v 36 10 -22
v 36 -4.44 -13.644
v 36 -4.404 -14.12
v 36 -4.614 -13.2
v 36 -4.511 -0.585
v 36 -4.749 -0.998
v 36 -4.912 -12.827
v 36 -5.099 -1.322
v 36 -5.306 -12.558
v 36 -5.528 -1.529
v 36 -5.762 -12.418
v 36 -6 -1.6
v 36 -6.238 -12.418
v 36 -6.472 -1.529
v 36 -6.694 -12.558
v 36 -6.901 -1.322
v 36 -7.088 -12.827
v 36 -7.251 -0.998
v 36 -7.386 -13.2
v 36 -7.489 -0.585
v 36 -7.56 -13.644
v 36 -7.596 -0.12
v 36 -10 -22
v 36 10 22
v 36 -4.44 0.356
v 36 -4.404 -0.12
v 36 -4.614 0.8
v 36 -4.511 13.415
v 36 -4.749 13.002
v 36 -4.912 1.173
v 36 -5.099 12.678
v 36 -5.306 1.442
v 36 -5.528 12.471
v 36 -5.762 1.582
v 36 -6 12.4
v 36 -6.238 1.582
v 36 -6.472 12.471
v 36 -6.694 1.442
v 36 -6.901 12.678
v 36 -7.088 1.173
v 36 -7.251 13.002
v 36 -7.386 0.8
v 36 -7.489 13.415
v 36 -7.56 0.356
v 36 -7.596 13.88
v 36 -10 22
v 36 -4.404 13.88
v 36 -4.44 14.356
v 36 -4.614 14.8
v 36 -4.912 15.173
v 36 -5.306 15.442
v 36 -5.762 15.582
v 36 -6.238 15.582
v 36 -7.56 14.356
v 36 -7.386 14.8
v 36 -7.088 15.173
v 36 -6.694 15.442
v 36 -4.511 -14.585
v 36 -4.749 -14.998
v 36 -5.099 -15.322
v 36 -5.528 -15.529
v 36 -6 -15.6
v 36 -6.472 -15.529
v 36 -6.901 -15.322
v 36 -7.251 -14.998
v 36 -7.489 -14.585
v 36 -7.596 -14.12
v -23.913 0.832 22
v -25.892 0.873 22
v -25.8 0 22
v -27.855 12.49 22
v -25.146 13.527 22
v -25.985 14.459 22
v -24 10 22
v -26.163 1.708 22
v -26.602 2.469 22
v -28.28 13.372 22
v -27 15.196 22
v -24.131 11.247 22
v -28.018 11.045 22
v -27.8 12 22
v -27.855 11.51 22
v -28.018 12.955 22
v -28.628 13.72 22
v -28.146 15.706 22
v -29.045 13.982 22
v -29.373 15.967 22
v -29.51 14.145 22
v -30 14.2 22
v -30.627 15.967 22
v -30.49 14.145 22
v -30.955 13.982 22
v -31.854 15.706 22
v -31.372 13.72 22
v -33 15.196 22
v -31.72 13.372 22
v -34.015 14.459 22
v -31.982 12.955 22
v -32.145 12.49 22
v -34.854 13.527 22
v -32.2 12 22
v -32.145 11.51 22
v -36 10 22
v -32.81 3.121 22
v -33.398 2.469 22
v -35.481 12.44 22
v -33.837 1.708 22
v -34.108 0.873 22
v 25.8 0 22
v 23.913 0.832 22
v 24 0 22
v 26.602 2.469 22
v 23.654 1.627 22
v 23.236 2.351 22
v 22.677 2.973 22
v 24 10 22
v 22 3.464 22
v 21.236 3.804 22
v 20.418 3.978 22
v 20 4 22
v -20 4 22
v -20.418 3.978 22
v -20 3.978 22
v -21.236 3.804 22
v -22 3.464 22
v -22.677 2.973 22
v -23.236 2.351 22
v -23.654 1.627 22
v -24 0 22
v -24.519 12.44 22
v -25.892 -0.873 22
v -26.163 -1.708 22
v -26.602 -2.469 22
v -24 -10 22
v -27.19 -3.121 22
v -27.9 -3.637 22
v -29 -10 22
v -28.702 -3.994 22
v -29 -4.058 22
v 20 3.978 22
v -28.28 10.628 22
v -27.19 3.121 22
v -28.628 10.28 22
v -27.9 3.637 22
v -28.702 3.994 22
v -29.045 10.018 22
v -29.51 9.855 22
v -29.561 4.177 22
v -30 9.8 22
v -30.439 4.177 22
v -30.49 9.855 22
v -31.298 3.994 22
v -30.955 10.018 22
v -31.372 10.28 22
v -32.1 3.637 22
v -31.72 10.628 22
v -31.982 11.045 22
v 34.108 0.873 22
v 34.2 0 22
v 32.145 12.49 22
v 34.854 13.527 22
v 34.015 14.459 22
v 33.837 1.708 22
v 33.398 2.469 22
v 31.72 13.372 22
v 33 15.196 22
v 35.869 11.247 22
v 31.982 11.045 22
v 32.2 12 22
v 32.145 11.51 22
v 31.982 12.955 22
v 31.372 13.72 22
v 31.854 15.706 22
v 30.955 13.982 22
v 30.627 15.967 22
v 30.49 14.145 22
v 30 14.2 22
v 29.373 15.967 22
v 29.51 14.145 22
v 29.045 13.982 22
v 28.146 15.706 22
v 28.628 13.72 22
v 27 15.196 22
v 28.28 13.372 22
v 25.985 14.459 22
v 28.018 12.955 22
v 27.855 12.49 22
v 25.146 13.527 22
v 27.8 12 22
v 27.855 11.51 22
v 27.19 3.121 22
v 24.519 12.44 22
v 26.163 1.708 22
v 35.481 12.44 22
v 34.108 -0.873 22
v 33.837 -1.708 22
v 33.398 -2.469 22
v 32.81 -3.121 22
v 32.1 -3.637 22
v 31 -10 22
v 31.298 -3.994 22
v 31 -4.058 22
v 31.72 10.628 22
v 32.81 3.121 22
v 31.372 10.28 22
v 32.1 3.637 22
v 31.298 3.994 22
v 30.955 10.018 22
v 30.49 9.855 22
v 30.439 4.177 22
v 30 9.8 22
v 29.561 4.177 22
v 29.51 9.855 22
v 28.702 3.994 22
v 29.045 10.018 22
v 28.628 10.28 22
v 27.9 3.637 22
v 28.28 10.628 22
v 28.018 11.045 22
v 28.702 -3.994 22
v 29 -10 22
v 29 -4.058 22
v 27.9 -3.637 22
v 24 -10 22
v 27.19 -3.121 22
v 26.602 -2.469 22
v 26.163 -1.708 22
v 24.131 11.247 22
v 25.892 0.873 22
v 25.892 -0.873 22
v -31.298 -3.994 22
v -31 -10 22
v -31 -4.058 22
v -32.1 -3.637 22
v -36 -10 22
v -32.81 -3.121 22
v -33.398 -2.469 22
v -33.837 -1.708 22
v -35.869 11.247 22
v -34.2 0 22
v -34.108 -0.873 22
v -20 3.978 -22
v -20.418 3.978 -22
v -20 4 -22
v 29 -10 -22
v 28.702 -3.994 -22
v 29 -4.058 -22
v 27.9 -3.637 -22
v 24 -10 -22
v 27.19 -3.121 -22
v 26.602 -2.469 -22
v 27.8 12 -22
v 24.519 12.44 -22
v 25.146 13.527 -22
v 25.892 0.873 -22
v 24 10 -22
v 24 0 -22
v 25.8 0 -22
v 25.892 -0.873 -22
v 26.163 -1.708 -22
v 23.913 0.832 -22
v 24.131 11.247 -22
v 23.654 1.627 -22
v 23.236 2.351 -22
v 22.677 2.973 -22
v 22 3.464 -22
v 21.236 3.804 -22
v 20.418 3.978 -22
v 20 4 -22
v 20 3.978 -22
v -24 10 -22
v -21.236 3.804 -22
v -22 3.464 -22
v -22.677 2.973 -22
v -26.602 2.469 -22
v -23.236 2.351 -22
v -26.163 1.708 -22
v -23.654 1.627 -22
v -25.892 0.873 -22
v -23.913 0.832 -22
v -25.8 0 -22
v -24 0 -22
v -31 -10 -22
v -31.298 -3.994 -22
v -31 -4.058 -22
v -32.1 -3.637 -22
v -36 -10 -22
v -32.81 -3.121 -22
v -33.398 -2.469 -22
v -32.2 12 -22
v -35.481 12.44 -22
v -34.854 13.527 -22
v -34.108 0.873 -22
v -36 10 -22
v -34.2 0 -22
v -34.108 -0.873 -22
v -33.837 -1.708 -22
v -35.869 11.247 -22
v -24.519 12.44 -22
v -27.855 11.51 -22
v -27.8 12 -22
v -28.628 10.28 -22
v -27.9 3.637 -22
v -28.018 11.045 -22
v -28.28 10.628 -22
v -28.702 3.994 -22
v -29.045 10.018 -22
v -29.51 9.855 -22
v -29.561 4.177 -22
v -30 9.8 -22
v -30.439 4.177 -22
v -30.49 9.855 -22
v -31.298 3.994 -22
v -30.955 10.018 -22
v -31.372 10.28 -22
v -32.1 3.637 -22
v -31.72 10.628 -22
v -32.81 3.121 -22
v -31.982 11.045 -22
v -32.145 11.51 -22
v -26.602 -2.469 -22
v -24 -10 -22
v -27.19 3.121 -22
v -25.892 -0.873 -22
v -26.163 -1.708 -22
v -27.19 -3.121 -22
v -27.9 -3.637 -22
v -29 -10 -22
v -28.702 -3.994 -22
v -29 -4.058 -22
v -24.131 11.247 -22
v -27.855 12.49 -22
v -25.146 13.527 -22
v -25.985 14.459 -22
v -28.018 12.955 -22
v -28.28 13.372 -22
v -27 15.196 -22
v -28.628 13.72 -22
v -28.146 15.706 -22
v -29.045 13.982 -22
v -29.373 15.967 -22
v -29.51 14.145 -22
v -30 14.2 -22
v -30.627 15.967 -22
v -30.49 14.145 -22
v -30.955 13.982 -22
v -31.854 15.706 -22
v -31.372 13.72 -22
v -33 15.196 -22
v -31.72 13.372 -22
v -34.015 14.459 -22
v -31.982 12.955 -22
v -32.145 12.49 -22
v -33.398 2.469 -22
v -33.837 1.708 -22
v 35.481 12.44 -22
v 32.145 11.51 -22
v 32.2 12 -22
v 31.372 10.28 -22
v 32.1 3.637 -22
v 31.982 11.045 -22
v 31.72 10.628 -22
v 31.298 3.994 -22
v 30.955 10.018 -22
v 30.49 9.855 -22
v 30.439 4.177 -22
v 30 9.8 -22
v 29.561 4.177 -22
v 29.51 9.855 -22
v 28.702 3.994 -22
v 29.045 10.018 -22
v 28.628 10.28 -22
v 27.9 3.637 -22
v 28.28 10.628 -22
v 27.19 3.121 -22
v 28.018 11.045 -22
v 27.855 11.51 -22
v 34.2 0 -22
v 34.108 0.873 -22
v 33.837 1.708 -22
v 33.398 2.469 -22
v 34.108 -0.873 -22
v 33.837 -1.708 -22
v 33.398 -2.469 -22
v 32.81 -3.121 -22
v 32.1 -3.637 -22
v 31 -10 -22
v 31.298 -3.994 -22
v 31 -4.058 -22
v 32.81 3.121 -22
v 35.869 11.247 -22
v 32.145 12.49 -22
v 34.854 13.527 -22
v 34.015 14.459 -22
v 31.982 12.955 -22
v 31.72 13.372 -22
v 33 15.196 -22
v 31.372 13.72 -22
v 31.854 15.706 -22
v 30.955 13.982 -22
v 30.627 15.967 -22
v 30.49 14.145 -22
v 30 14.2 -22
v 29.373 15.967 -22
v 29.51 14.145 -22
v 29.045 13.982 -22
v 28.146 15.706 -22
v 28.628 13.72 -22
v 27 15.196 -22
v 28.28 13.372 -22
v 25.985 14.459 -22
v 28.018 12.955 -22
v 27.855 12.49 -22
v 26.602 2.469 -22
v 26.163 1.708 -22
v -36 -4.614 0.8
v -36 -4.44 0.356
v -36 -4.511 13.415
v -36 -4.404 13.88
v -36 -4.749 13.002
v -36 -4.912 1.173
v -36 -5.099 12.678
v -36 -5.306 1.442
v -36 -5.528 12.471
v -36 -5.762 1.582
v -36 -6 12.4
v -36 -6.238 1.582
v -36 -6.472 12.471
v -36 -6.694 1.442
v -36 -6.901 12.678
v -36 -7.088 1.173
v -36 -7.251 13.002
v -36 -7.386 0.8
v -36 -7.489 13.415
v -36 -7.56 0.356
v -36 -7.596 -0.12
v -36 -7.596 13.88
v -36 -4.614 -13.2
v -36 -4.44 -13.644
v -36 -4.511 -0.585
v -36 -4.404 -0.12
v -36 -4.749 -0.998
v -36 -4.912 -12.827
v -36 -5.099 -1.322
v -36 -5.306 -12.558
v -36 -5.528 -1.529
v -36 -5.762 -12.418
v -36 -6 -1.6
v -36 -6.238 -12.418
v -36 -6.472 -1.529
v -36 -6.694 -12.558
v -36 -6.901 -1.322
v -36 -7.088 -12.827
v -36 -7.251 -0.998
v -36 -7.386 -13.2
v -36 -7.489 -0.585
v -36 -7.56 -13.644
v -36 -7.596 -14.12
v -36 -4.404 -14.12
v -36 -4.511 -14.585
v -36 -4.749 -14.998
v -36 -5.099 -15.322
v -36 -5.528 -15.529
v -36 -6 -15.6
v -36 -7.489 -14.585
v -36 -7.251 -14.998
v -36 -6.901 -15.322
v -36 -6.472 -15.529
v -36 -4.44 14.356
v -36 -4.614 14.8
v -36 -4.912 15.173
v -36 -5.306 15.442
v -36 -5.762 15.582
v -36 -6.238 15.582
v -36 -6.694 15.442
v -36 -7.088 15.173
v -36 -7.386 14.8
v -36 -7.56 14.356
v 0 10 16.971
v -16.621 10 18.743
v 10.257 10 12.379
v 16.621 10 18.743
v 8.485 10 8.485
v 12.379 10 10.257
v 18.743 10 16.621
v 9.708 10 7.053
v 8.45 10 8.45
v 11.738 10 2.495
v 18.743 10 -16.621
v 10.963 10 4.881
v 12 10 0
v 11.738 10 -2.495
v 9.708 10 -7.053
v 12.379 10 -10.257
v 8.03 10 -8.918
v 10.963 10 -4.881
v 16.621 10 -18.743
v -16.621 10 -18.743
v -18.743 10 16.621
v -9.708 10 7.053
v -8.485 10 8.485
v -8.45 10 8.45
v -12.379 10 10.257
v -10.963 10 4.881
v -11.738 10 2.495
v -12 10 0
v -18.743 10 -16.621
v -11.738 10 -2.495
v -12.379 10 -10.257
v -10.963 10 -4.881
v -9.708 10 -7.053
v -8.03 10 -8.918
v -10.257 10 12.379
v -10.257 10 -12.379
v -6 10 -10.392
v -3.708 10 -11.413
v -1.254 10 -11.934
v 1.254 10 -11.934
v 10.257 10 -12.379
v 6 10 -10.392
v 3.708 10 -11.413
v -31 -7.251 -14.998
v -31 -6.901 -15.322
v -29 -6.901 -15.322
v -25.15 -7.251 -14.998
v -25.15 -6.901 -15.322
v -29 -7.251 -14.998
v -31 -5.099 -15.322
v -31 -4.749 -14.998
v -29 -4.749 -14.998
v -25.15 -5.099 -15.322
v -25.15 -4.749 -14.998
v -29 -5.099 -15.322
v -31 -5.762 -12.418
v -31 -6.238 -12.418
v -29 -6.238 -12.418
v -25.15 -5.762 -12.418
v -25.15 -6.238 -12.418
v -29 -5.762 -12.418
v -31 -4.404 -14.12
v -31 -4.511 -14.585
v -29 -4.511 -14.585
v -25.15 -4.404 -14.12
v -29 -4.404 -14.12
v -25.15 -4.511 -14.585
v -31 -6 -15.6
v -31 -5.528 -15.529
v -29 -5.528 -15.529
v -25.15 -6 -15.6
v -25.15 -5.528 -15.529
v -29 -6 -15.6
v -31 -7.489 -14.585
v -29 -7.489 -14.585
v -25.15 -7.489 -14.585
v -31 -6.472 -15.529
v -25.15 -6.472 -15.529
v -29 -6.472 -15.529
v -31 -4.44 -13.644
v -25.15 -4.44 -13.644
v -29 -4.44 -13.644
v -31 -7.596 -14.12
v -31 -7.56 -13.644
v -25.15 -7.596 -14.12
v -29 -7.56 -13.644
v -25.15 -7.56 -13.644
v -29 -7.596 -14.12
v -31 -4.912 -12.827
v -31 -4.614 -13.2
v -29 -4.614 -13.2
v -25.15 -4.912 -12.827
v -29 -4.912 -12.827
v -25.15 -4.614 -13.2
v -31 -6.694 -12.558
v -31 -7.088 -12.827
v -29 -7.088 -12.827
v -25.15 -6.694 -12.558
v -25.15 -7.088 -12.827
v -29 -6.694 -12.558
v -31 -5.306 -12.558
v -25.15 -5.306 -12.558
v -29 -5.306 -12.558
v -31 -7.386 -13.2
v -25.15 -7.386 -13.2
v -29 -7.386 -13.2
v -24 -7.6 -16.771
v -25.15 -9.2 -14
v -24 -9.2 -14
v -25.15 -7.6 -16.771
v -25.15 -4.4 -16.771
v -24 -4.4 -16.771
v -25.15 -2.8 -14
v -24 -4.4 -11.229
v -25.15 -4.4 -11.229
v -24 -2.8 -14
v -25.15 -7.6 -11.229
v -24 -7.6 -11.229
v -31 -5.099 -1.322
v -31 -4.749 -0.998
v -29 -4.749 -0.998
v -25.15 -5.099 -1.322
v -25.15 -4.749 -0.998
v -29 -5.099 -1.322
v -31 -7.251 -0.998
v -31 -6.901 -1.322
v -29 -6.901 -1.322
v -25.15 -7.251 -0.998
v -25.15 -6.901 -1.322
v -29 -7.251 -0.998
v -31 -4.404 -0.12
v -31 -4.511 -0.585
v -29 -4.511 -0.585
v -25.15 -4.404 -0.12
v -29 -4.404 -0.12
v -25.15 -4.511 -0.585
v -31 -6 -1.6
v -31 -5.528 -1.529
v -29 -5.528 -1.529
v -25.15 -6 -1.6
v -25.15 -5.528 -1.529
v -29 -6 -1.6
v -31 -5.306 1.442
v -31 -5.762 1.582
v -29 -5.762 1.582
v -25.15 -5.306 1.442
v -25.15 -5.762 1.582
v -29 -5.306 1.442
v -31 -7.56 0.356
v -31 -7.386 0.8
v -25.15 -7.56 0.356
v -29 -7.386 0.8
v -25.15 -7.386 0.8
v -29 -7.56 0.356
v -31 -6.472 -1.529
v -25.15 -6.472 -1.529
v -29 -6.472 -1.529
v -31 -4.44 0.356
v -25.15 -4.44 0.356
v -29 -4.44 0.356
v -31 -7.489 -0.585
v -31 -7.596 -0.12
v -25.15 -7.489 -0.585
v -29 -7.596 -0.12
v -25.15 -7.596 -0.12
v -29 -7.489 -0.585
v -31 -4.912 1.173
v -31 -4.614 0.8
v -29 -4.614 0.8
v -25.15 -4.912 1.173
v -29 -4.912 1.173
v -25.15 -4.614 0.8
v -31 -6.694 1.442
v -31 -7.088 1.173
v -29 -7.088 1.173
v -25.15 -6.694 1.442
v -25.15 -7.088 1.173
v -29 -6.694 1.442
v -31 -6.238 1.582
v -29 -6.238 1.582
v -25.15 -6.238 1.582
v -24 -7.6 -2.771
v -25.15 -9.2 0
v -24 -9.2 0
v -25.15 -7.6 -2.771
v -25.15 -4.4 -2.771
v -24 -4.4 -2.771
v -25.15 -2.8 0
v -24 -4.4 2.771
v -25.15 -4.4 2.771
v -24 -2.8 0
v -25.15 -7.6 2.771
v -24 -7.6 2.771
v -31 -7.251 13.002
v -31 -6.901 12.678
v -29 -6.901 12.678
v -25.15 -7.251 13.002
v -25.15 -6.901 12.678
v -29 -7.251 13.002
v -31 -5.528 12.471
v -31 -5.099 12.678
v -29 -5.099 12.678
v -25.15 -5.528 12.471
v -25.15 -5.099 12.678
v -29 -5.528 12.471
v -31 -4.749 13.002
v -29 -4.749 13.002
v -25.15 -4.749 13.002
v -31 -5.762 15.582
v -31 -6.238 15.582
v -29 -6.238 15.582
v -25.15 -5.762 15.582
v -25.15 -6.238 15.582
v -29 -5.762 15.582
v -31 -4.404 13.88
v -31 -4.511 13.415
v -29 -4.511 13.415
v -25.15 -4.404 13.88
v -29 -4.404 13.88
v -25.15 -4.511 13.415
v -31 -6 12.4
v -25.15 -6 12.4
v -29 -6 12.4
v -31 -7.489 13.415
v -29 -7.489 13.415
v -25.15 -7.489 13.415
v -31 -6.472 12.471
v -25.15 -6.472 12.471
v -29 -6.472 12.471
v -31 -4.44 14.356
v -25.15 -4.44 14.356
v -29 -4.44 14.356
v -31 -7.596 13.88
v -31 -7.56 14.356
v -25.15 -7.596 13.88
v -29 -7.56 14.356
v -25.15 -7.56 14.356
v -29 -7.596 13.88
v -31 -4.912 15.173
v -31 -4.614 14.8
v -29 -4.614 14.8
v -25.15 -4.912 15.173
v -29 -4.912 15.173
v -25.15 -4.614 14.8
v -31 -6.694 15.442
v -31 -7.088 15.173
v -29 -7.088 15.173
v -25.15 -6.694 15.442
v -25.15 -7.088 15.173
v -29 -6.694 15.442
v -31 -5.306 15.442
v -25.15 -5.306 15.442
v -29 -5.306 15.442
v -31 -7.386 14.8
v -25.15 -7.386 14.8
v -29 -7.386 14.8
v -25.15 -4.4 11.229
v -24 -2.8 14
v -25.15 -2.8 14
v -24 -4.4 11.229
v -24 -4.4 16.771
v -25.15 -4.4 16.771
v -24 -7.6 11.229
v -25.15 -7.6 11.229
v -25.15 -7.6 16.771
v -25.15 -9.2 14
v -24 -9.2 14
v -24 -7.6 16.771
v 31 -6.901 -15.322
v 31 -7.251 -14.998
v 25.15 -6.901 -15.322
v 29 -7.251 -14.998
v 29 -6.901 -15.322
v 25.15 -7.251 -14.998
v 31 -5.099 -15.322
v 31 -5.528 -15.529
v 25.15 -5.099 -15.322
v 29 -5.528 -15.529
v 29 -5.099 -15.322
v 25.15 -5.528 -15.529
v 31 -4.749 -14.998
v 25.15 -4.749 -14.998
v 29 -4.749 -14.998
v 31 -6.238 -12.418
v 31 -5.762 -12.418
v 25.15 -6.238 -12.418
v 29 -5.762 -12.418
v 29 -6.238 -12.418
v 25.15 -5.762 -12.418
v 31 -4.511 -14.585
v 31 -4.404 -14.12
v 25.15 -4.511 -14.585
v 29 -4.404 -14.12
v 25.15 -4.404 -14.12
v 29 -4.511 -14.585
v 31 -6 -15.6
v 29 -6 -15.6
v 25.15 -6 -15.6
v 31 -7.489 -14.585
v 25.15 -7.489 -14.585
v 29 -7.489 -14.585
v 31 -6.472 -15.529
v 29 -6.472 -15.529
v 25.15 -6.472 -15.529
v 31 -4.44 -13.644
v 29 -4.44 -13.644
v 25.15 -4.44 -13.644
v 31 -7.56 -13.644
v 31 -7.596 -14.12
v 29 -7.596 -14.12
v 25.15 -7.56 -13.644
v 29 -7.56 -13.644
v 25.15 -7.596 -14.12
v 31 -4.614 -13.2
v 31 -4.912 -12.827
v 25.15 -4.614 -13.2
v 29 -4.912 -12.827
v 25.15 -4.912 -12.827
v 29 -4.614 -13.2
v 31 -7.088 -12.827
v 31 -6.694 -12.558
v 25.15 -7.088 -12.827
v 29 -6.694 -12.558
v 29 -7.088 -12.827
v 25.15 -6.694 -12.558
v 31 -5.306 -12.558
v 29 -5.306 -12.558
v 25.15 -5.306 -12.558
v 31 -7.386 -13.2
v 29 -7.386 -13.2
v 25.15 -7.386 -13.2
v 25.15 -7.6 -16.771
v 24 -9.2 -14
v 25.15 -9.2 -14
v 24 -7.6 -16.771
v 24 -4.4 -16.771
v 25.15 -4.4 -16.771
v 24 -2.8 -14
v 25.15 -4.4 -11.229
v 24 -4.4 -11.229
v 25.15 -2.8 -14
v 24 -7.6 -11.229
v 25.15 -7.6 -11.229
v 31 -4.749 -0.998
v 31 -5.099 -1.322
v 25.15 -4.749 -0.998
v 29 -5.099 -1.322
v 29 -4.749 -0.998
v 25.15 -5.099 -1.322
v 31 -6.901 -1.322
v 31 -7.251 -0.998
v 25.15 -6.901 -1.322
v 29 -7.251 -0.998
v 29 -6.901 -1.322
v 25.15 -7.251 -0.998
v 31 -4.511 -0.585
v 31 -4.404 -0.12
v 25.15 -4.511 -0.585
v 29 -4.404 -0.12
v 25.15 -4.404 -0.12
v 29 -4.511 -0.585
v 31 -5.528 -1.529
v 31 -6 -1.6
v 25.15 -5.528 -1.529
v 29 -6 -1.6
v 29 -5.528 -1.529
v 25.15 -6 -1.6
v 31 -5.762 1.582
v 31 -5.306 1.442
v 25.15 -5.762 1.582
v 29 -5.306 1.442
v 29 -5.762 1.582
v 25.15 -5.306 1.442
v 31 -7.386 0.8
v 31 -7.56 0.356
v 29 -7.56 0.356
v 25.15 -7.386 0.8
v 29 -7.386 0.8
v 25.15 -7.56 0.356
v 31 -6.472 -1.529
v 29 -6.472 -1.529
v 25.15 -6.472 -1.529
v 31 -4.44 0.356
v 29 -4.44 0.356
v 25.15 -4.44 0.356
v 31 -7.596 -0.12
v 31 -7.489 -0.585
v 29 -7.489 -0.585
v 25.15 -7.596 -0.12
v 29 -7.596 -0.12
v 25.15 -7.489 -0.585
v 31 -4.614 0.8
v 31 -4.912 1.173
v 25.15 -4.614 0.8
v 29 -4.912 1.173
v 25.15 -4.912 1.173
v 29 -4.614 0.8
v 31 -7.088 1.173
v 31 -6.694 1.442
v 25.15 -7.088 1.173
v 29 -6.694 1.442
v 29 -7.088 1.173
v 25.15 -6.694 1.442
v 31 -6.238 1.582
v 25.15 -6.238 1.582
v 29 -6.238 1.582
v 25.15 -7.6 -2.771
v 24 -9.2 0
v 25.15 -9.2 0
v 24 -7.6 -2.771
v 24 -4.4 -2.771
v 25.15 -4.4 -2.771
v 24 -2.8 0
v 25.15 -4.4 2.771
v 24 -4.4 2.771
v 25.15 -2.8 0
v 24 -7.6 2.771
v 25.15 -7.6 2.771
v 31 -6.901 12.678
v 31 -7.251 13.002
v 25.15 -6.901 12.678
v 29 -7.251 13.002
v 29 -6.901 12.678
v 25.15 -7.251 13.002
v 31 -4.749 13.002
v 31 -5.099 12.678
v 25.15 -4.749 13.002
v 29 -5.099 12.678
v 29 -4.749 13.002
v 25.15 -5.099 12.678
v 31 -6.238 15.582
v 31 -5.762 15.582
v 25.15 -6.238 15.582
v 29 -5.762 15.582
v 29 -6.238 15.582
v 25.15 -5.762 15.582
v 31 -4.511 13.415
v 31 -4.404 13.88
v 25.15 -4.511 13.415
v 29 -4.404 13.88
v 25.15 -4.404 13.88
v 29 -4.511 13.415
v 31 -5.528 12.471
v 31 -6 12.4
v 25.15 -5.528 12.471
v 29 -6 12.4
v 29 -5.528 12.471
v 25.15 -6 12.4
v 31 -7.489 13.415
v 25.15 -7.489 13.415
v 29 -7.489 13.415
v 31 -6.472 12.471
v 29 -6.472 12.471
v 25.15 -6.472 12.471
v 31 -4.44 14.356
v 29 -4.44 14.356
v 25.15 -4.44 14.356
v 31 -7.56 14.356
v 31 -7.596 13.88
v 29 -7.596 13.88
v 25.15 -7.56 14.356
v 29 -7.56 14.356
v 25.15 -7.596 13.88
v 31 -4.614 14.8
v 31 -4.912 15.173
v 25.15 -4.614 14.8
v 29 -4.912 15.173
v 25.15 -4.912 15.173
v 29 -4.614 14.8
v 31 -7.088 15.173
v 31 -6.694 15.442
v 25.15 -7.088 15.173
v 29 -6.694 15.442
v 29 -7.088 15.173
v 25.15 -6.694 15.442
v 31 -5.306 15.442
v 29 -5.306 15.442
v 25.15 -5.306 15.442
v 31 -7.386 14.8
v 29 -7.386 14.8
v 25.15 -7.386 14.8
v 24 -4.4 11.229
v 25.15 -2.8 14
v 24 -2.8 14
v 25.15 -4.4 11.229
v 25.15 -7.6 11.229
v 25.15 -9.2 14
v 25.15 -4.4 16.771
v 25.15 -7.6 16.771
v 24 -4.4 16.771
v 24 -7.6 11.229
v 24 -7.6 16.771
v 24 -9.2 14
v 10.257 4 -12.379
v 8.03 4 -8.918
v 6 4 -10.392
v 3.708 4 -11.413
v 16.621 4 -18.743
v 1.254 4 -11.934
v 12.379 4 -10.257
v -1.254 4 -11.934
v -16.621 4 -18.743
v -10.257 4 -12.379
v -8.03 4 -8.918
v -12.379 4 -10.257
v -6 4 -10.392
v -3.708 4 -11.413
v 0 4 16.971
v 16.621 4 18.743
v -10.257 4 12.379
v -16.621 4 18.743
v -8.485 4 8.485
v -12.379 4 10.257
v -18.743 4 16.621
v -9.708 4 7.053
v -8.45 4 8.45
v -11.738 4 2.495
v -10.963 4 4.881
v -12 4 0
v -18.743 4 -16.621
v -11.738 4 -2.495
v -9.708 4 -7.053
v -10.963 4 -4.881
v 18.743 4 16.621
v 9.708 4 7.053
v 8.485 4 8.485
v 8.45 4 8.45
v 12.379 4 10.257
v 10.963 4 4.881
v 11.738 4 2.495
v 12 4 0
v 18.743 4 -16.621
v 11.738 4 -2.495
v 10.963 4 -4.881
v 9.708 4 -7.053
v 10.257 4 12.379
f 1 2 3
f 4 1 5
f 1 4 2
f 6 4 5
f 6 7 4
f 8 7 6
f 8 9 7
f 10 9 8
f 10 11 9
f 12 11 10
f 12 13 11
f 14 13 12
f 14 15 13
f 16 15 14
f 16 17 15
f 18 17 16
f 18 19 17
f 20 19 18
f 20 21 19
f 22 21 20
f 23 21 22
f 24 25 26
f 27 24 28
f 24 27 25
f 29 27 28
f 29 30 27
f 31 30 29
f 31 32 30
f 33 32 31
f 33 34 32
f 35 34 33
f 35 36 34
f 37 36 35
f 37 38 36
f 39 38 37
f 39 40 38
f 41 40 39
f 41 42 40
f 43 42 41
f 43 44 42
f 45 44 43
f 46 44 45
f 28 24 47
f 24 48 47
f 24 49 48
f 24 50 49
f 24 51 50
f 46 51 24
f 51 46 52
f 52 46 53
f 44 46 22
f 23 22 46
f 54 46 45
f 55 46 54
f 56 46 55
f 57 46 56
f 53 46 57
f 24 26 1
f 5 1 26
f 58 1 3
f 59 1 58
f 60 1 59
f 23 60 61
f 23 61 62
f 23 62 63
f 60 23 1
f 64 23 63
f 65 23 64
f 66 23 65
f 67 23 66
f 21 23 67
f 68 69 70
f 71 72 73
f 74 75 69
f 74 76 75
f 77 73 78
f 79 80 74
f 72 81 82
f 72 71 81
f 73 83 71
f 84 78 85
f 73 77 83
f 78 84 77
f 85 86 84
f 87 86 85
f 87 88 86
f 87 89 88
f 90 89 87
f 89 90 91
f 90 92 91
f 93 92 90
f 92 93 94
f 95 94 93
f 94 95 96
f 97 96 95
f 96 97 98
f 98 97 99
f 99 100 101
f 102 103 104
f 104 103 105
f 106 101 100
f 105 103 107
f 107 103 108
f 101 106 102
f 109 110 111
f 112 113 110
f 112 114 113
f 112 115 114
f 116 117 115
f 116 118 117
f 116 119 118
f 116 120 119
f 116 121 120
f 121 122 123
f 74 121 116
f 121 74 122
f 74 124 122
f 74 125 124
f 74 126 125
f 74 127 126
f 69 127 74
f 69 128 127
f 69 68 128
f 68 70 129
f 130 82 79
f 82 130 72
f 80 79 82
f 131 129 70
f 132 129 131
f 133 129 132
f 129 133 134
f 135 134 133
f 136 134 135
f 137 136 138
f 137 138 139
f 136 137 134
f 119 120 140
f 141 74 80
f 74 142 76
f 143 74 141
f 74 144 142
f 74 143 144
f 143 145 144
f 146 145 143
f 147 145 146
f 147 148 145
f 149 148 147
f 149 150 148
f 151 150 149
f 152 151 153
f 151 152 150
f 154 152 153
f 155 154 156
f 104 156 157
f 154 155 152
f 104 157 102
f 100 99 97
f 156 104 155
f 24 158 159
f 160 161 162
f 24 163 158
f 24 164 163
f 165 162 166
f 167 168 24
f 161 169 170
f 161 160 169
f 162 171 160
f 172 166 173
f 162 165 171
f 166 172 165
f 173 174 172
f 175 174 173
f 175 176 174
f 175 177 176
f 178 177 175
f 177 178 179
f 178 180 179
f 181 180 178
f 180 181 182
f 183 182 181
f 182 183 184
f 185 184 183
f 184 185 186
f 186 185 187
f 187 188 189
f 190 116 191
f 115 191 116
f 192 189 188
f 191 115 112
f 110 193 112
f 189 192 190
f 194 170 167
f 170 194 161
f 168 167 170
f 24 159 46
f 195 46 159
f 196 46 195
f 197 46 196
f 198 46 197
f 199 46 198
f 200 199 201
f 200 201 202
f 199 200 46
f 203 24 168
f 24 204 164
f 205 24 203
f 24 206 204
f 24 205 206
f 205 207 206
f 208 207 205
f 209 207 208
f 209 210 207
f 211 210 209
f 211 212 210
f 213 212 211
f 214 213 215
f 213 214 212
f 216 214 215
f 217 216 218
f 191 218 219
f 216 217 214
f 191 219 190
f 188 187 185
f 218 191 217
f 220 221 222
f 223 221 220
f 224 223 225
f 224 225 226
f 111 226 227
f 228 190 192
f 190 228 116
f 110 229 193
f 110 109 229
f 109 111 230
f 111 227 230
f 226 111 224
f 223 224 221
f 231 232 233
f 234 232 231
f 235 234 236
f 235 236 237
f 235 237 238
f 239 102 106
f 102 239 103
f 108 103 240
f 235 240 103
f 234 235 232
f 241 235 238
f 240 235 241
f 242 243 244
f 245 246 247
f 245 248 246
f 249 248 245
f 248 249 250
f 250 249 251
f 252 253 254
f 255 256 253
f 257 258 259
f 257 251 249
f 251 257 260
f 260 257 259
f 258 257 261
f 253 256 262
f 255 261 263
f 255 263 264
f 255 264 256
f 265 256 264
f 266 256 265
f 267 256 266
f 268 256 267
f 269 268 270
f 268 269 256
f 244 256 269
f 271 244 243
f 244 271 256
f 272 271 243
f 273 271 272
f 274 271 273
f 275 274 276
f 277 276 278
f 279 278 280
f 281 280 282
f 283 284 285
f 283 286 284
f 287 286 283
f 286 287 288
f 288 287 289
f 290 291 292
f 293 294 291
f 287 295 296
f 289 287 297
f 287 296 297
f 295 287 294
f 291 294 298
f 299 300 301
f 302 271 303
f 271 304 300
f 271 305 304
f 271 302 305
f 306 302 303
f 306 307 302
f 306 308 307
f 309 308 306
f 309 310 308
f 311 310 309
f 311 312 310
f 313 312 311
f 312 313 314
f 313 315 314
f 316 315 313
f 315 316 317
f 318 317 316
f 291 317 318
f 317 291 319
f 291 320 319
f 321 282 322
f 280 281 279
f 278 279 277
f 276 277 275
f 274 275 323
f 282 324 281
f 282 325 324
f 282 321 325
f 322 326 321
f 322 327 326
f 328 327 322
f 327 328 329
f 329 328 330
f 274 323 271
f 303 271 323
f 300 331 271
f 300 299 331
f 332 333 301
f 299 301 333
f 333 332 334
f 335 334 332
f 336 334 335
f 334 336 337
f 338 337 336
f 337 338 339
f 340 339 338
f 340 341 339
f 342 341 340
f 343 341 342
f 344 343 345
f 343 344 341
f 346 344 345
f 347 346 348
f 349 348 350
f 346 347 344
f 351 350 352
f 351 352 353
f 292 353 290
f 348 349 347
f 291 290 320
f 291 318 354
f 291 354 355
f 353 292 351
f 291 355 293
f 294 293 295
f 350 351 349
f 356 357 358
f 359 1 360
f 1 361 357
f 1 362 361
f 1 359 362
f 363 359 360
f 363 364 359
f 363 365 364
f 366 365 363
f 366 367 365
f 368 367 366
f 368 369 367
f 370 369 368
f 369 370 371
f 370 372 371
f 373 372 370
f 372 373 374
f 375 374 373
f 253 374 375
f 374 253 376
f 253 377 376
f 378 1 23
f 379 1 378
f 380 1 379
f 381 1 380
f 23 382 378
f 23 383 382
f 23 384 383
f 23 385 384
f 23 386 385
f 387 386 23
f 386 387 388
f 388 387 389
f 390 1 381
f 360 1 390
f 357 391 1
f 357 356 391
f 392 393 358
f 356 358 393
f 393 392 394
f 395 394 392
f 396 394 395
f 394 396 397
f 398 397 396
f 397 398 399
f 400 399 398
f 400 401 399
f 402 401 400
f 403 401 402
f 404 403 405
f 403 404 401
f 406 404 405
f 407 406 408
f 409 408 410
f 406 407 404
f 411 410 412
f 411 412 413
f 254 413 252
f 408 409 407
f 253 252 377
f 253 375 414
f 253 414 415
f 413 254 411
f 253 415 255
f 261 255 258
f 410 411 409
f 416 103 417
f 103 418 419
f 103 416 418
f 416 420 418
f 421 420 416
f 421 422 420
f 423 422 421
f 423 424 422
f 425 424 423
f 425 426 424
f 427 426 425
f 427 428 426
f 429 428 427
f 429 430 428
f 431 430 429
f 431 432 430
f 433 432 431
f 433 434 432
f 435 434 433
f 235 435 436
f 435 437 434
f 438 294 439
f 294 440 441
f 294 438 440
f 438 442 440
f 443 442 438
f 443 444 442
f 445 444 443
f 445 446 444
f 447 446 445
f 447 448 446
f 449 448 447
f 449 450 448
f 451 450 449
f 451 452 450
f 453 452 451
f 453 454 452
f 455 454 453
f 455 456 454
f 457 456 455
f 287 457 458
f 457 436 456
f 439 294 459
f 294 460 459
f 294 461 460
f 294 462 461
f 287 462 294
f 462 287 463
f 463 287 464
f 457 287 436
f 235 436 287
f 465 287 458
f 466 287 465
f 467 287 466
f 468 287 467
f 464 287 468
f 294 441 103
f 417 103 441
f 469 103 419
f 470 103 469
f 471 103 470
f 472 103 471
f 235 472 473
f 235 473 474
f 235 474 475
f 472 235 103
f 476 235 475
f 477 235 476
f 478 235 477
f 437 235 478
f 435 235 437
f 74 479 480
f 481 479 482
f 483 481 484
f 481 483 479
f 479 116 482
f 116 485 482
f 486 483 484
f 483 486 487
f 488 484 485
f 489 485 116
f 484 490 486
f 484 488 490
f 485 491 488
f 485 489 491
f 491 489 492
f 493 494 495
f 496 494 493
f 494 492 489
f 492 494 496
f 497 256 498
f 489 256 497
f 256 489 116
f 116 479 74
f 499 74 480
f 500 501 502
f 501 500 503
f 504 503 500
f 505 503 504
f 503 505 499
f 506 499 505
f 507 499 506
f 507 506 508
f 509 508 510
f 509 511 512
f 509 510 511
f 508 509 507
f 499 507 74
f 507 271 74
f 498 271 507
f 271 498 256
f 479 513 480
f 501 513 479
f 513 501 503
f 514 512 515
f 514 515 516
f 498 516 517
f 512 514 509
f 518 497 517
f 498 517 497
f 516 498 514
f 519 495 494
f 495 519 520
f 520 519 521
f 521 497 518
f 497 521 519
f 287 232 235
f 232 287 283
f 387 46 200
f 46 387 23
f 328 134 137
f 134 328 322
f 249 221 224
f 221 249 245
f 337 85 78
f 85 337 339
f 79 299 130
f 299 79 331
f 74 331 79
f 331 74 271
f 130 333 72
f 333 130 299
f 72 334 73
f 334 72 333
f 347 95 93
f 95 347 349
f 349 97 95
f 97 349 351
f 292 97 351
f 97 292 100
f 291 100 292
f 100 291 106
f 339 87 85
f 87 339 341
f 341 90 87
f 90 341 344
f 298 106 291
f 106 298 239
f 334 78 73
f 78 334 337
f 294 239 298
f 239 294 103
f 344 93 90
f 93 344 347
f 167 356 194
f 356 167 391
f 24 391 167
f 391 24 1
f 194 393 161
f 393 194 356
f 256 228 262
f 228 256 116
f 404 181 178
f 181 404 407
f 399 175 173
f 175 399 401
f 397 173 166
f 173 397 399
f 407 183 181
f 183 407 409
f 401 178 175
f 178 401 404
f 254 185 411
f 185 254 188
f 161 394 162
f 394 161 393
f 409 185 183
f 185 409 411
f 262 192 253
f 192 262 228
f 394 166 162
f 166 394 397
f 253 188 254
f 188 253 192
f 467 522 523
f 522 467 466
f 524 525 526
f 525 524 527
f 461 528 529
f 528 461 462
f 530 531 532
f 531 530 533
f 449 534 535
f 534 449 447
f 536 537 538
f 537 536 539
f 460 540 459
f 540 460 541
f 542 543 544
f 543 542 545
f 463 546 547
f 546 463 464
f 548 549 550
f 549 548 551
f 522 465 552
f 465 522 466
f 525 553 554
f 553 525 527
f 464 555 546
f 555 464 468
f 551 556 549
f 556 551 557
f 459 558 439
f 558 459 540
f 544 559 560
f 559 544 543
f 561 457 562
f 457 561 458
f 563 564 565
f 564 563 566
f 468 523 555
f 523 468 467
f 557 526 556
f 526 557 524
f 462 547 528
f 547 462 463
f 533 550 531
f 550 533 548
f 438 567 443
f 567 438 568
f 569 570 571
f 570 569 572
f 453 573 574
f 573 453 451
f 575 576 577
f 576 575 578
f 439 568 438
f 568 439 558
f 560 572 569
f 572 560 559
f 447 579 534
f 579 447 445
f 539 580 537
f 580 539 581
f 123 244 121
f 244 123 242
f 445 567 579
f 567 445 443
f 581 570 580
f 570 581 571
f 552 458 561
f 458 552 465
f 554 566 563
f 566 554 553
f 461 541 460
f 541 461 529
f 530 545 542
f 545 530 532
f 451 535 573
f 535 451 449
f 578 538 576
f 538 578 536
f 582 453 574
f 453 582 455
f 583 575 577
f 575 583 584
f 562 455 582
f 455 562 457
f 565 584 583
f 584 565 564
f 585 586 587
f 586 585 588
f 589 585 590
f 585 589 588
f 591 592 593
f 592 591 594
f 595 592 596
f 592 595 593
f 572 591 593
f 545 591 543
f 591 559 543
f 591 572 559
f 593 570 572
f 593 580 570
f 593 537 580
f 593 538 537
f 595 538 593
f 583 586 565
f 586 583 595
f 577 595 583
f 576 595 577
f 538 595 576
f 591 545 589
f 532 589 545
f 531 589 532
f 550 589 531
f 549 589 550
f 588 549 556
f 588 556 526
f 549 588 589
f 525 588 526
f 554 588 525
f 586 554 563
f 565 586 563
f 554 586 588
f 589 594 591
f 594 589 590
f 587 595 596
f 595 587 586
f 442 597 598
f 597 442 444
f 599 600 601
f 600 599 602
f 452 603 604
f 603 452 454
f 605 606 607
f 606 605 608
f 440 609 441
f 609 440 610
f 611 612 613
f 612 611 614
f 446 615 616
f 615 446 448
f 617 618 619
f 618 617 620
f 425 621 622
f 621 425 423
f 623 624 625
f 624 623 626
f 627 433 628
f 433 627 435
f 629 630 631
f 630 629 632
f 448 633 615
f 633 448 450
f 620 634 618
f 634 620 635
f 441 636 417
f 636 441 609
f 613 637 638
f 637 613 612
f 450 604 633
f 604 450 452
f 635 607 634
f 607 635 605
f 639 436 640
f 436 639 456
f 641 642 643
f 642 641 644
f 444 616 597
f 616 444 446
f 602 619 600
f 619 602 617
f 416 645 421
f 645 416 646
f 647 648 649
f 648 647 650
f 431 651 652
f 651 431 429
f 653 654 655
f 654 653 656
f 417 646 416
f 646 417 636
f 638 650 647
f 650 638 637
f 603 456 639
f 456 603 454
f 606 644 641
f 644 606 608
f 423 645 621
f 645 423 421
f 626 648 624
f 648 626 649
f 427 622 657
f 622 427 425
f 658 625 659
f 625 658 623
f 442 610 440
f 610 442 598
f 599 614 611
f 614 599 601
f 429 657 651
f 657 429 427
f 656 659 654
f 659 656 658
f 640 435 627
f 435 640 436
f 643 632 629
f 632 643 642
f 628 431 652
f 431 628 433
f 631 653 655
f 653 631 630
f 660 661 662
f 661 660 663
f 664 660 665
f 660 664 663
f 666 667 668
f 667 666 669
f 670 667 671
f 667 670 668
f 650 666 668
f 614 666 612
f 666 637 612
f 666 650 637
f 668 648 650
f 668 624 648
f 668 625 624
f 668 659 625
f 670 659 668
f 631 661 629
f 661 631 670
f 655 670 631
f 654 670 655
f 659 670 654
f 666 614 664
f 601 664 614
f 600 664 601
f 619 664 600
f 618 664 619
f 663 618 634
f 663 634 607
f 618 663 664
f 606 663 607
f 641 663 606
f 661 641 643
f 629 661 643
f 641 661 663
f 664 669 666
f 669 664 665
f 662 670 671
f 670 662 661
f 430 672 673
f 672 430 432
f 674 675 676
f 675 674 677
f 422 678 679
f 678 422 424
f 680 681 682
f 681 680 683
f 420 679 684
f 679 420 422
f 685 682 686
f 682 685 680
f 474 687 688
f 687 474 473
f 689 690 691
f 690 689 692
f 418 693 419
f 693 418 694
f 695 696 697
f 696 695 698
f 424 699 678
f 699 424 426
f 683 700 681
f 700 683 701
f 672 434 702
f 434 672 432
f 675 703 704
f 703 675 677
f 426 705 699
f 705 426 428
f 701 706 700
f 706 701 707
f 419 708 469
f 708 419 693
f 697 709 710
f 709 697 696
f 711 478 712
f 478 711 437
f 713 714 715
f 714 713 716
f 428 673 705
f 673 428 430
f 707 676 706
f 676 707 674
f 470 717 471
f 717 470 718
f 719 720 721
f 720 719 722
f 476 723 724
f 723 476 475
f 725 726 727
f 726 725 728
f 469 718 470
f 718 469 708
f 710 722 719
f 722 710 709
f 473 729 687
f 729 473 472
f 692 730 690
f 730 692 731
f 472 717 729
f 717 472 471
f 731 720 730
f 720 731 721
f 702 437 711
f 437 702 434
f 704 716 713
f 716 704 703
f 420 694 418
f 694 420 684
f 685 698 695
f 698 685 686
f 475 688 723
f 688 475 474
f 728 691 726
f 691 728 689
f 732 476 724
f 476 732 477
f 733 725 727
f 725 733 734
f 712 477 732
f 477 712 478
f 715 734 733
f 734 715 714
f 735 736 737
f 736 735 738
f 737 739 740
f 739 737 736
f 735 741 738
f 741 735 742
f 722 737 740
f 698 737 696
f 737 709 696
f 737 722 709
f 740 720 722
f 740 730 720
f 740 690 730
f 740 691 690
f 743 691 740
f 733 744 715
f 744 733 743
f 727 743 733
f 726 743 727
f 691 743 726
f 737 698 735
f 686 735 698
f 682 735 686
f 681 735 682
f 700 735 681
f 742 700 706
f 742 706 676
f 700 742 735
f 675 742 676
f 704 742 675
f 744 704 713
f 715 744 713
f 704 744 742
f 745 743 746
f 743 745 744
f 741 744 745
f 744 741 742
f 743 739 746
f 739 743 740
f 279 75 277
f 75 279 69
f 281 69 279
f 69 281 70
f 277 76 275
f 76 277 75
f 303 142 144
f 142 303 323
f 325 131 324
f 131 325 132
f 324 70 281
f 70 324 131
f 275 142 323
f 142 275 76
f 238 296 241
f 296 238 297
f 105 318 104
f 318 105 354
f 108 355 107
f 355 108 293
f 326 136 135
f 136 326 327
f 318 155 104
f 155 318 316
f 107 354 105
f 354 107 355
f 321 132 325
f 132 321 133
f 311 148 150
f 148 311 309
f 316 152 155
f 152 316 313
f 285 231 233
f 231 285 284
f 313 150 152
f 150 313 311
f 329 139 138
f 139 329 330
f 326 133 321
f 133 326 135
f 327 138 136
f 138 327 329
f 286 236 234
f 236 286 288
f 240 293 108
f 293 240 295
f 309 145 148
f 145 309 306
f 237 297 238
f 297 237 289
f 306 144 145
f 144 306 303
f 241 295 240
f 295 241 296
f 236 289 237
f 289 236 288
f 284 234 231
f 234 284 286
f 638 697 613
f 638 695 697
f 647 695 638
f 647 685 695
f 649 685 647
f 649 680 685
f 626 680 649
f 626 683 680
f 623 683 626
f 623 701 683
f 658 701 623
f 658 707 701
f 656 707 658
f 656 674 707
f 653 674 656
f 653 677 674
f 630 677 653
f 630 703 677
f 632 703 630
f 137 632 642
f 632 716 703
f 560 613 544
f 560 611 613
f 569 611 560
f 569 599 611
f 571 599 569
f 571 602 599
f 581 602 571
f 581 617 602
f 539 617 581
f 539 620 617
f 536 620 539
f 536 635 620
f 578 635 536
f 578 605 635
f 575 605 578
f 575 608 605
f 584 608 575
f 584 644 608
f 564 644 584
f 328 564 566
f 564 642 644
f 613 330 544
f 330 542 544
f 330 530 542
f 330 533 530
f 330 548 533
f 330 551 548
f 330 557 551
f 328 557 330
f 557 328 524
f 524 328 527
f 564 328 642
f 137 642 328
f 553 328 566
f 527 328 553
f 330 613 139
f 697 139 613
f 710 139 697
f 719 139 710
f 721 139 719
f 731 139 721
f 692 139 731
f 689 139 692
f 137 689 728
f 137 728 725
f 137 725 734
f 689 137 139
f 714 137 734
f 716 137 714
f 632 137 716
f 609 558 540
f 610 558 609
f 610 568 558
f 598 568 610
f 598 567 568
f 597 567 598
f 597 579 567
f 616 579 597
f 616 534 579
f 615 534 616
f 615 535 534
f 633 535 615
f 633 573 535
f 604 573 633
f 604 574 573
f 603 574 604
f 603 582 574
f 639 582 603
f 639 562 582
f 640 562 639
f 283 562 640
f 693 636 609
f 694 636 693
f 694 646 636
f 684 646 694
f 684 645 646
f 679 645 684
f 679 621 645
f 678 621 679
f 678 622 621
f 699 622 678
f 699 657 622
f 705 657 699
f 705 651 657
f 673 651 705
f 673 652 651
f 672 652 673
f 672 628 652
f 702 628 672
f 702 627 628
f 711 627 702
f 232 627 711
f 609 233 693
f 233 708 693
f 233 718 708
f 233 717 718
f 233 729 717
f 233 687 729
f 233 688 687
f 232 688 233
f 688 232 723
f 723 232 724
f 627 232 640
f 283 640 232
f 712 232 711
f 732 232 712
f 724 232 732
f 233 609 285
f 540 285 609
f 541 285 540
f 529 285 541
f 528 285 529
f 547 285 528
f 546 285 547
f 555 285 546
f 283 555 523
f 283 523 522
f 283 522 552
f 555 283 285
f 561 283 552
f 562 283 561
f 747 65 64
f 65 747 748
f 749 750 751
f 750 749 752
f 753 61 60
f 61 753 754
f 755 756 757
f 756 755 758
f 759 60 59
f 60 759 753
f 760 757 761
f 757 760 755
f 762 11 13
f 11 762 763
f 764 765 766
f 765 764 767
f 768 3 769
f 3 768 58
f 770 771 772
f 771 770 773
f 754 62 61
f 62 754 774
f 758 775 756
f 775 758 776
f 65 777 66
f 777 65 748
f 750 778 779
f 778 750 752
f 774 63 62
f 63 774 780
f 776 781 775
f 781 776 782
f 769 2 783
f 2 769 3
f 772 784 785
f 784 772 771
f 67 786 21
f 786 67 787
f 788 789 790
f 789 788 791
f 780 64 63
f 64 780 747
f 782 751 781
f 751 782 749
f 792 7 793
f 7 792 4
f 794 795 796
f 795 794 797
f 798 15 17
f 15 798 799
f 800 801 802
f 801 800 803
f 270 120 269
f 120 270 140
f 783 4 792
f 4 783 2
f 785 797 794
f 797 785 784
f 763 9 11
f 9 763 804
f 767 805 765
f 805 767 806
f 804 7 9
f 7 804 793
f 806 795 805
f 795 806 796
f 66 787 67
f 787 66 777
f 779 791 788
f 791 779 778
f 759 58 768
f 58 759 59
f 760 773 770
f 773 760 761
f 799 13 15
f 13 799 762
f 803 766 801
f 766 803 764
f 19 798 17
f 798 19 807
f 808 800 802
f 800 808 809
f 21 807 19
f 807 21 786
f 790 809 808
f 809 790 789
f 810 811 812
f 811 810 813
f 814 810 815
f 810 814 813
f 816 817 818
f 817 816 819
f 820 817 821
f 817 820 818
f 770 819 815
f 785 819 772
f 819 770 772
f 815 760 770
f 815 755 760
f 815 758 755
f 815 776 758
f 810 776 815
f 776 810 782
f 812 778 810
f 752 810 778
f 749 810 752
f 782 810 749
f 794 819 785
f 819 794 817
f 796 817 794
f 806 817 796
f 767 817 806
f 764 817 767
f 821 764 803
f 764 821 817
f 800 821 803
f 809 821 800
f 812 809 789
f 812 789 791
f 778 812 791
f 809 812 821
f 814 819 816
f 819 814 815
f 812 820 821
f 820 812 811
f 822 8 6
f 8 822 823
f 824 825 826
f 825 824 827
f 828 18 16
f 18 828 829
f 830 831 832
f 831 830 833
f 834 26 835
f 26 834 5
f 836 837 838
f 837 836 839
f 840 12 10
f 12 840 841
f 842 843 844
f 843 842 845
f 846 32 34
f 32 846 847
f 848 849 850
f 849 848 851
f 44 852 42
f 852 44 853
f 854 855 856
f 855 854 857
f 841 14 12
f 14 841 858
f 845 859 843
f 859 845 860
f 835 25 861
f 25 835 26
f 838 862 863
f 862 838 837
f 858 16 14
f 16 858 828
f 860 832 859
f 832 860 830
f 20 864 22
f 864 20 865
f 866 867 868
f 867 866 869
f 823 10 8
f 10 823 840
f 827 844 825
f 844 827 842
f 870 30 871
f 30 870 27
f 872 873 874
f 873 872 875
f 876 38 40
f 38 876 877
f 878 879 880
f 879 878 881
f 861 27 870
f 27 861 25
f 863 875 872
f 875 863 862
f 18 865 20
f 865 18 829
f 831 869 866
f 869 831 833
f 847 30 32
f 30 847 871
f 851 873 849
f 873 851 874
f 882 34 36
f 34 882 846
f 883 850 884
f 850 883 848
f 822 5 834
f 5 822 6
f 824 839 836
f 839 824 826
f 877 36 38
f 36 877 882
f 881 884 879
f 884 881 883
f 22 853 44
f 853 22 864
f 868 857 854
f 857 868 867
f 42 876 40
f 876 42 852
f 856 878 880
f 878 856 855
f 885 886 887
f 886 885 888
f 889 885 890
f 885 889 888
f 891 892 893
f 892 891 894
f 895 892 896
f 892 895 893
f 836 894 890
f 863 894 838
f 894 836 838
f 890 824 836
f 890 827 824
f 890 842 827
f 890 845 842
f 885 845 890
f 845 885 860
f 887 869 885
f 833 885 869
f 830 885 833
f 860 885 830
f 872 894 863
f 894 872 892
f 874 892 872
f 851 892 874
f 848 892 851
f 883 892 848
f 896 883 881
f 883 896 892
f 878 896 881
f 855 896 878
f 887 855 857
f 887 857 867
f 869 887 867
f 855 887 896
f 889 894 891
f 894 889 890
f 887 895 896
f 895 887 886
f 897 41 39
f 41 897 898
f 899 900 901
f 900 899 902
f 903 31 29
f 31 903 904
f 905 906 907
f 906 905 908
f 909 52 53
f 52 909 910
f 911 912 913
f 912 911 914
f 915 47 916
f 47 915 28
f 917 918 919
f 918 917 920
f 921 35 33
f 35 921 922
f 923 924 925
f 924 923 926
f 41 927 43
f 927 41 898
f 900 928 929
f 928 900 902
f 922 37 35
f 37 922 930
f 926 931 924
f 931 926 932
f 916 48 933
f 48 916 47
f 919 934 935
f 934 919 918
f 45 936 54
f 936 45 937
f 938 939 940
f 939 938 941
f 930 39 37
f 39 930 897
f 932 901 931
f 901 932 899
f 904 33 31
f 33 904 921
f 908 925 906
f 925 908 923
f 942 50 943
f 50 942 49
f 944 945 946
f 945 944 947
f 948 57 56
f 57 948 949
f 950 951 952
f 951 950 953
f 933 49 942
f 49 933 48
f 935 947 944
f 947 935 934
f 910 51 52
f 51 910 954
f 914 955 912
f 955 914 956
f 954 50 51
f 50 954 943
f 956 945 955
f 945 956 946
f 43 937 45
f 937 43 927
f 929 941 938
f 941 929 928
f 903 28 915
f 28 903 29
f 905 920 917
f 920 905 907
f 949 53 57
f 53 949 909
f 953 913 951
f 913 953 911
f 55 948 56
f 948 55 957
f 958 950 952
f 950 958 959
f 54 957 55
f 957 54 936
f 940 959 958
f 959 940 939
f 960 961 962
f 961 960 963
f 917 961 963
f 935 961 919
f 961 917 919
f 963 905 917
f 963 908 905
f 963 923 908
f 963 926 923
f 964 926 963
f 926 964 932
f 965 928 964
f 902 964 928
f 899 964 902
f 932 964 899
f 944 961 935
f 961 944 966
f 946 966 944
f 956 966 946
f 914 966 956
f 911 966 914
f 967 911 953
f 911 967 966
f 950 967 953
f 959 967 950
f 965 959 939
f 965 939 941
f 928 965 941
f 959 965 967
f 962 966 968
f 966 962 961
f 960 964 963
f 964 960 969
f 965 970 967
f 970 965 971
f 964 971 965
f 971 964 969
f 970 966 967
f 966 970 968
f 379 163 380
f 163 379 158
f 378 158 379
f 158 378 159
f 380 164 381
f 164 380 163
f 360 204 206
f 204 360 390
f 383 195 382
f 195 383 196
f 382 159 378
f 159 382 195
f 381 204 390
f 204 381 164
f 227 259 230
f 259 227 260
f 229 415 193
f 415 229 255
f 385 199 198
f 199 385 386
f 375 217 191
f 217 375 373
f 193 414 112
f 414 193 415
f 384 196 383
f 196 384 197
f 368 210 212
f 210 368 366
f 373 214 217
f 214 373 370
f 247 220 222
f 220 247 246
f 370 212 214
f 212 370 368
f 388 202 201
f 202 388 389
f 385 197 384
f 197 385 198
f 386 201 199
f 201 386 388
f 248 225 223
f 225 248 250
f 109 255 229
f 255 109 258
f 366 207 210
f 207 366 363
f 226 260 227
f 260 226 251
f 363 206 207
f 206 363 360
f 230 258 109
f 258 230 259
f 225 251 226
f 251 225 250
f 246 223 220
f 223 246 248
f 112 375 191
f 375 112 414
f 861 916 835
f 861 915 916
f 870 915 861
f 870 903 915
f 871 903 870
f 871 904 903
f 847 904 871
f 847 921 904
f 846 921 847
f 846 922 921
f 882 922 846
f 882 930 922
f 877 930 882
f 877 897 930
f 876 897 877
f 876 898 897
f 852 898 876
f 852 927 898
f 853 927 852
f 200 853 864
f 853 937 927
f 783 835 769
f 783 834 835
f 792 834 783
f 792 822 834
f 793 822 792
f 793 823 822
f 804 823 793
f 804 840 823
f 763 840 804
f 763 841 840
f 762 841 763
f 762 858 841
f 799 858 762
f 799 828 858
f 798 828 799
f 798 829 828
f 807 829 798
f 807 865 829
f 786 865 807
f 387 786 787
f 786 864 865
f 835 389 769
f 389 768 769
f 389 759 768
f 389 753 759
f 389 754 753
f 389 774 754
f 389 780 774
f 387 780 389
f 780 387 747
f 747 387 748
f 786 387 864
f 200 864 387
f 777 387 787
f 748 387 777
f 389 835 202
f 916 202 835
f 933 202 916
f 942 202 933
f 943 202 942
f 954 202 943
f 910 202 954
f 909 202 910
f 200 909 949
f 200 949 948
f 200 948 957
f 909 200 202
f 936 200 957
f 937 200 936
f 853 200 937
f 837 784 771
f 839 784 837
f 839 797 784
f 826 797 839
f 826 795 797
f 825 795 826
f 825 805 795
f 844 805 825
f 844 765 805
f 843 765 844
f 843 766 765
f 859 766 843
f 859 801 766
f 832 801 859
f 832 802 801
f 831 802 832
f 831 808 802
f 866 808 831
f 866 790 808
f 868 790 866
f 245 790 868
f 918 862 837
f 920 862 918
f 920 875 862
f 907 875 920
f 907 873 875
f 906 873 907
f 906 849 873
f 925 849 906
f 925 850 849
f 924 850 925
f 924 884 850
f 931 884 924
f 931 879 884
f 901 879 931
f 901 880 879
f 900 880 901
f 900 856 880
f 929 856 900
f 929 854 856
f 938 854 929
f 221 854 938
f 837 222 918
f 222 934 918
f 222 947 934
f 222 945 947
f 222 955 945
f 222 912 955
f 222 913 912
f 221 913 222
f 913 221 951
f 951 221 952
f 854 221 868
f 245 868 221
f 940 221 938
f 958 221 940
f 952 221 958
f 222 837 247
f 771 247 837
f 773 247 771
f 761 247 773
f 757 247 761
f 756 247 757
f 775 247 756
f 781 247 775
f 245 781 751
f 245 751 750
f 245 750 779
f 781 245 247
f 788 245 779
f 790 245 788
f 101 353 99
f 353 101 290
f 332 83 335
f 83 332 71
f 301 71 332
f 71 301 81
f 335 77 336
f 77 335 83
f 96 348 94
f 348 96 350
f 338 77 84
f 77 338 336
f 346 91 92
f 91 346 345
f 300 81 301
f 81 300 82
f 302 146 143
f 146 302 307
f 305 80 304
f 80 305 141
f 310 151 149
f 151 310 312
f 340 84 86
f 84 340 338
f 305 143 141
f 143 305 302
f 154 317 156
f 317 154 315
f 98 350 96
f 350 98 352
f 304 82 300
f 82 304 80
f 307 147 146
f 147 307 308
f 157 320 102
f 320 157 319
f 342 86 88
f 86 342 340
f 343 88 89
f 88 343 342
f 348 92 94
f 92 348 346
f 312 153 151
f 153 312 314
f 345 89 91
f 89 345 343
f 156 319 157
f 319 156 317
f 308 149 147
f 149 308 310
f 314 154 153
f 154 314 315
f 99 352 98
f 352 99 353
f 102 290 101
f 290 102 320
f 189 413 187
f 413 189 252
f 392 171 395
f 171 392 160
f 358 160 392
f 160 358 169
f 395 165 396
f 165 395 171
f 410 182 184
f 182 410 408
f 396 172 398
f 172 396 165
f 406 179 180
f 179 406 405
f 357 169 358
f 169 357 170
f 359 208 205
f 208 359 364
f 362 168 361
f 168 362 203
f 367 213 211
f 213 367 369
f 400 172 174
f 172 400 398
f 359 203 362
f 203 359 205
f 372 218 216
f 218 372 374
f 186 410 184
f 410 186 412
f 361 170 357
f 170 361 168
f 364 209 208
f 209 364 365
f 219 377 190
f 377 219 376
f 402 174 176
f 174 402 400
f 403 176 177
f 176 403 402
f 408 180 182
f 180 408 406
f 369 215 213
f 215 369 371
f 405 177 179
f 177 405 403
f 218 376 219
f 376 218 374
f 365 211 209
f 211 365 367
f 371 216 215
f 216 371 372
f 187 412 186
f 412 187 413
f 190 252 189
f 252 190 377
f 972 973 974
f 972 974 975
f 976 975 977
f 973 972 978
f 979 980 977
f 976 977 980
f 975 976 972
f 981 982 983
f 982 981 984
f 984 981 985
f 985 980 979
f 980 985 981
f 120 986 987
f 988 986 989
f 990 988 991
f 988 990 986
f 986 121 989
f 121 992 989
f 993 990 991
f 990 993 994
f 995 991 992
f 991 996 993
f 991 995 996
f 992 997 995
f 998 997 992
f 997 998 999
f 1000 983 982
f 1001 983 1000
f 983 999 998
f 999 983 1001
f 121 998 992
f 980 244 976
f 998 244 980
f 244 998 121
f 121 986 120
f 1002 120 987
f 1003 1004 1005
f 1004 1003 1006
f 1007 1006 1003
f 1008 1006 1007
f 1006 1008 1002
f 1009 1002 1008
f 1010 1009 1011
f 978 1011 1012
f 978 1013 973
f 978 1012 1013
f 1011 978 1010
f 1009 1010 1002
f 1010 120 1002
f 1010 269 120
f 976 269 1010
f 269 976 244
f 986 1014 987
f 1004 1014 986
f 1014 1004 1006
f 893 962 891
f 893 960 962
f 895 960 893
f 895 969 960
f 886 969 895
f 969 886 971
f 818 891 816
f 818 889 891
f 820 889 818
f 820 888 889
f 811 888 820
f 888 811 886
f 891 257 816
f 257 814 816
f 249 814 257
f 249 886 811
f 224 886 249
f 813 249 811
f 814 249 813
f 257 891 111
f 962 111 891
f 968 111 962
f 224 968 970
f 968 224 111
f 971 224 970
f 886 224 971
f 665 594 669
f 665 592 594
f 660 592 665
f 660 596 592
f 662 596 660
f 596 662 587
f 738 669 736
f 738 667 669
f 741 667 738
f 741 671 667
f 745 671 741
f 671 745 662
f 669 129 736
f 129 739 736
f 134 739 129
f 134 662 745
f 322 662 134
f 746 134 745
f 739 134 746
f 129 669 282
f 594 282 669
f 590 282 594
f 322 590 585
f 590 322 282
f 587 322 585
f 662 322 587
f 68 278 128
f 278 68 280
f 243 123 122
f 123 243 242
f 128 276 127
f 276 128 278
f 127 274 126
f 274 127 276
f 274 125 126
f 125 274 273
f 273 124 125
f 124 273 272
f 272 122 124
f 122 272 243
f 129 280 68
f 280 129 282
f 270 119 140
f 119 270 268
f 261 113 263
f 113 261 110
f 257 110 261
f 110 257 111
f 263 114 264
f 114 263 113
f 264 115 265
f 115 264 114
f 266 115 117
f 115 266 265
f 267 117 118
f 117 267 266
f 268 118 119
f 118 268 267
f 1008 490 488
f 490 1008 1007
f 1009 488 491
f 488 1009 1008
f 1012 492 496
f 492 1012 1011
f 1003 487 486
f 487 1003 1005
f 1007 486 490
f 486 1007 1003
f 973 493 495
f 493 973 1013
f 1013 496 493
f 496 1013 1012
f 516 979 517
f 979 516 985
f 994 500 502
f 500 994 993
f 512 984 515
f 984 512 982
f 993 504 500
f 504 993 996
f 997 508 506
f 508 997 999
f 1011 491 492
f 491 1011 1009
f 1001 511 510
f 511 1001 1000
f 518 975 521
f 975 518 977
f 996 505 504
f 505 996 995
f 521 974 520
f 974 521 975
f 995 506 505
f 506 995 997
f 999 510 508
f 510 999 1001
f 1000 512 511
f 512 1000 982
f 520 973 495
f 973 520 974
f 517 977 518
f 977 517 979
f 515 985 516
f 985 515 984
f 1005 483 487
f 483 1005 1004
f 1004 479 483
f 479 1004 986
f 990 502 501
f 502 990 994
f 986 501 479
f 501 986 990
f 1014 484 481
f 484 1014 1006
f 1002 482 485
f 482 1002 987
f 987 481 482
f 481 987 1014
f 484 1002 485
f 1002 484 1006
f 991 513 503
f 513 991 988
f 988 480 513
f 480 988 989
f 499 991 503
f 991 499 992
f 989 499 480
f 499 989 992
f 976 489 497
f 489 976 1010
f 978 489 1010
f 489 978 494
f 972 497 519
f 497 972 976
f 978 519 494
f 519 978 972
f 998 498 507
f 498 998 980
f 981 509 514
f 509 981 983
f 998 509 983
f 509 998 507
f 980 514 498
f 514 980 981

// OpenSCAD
$fa = 12;
$fs = 0.5;

h = 44; // Height
w = 60; // Smooth rod distance (center to center)
m = 29; // Motor mounting screws distance (center to center)

module motor_end() {
	difference() {
		union() {
			translate([0, 0, 0]) cube([w+12, 20, h], center=true);
			// Sandwich mount
			translate([-w/2, 10, 0]) cylinder(r=6, h=h, center=true);
			translate([w/2, 10, 0]) cylinder(r=6, h=h, center=true);
		}
		// Sandwich mount
		translate([-w/2, 12, 0]) cylinder(r=2.2, h=h+1, center=true);
		translate([w/2, 12, 0]) cylinder(r=2.2, h=h+1, center=true);
		// Smooth rod and mounting slots
		for (x = [-w/2, w/2]) {
			translate([x, 0, 0]) {
				cylinder(r=4.2, h=h+1, center=true);
				translate([0, -10, 0]) cube([2, 20, h+1], center=true);
				for (z = [-h/2+8, 0, h/2-8]) {
					// M3 screw hole
					translate([0, -6, z]) rotate([0, 90, 0])
						cylinder(r=1.6, h=20, center=true);
					// M3 nut holder
					translate([-x/5, -6, z])
						rotate([30, 0, 0]) rotate([0, 90, 0])
						cylinder(r=3.2, h=2.3, center=true, $fn=6);
				}
			}
		}
		// Belt path
		translate([0, -6, 0]) cube([w-20, 20, h+1], center=true);
		translate([0, -10, 0]) cube([w-12, 20, h+1], center=true);
		translate([-w/2+10, 0, 0]) cylinder(r=4, h=h+1, center=true);
		translate([w/2-10, 0, 0]) cylinder(r=4, h=h+1, center=true);
		// Motor shaft (RepRap logo)
		rotate([90]) cylinder(r=12, h=40, center=true);
		translate([0, 0, sin(45)*12]) rotate([0, 45])
			cube([12, 40, 12], center=true);
		// Motor mounting screw slots
		translate([m/2, 0, m/2]) rotate([0, -45])
			cube([9, 40, 3], center=true);
		translate([-m/2, 0, m/2]) rotate([0, 45])
			cube([9, 40, 3], center=true);
		translate([m/2, 0, -m/2]) rotate([0, 45])
			cube([9, 40, 3], center=true);
		translate([-m/2, 0, -m/2]) rotate([0, -45])
			cube([9, 40, 3], center=true);
	}
}

motor_end();
